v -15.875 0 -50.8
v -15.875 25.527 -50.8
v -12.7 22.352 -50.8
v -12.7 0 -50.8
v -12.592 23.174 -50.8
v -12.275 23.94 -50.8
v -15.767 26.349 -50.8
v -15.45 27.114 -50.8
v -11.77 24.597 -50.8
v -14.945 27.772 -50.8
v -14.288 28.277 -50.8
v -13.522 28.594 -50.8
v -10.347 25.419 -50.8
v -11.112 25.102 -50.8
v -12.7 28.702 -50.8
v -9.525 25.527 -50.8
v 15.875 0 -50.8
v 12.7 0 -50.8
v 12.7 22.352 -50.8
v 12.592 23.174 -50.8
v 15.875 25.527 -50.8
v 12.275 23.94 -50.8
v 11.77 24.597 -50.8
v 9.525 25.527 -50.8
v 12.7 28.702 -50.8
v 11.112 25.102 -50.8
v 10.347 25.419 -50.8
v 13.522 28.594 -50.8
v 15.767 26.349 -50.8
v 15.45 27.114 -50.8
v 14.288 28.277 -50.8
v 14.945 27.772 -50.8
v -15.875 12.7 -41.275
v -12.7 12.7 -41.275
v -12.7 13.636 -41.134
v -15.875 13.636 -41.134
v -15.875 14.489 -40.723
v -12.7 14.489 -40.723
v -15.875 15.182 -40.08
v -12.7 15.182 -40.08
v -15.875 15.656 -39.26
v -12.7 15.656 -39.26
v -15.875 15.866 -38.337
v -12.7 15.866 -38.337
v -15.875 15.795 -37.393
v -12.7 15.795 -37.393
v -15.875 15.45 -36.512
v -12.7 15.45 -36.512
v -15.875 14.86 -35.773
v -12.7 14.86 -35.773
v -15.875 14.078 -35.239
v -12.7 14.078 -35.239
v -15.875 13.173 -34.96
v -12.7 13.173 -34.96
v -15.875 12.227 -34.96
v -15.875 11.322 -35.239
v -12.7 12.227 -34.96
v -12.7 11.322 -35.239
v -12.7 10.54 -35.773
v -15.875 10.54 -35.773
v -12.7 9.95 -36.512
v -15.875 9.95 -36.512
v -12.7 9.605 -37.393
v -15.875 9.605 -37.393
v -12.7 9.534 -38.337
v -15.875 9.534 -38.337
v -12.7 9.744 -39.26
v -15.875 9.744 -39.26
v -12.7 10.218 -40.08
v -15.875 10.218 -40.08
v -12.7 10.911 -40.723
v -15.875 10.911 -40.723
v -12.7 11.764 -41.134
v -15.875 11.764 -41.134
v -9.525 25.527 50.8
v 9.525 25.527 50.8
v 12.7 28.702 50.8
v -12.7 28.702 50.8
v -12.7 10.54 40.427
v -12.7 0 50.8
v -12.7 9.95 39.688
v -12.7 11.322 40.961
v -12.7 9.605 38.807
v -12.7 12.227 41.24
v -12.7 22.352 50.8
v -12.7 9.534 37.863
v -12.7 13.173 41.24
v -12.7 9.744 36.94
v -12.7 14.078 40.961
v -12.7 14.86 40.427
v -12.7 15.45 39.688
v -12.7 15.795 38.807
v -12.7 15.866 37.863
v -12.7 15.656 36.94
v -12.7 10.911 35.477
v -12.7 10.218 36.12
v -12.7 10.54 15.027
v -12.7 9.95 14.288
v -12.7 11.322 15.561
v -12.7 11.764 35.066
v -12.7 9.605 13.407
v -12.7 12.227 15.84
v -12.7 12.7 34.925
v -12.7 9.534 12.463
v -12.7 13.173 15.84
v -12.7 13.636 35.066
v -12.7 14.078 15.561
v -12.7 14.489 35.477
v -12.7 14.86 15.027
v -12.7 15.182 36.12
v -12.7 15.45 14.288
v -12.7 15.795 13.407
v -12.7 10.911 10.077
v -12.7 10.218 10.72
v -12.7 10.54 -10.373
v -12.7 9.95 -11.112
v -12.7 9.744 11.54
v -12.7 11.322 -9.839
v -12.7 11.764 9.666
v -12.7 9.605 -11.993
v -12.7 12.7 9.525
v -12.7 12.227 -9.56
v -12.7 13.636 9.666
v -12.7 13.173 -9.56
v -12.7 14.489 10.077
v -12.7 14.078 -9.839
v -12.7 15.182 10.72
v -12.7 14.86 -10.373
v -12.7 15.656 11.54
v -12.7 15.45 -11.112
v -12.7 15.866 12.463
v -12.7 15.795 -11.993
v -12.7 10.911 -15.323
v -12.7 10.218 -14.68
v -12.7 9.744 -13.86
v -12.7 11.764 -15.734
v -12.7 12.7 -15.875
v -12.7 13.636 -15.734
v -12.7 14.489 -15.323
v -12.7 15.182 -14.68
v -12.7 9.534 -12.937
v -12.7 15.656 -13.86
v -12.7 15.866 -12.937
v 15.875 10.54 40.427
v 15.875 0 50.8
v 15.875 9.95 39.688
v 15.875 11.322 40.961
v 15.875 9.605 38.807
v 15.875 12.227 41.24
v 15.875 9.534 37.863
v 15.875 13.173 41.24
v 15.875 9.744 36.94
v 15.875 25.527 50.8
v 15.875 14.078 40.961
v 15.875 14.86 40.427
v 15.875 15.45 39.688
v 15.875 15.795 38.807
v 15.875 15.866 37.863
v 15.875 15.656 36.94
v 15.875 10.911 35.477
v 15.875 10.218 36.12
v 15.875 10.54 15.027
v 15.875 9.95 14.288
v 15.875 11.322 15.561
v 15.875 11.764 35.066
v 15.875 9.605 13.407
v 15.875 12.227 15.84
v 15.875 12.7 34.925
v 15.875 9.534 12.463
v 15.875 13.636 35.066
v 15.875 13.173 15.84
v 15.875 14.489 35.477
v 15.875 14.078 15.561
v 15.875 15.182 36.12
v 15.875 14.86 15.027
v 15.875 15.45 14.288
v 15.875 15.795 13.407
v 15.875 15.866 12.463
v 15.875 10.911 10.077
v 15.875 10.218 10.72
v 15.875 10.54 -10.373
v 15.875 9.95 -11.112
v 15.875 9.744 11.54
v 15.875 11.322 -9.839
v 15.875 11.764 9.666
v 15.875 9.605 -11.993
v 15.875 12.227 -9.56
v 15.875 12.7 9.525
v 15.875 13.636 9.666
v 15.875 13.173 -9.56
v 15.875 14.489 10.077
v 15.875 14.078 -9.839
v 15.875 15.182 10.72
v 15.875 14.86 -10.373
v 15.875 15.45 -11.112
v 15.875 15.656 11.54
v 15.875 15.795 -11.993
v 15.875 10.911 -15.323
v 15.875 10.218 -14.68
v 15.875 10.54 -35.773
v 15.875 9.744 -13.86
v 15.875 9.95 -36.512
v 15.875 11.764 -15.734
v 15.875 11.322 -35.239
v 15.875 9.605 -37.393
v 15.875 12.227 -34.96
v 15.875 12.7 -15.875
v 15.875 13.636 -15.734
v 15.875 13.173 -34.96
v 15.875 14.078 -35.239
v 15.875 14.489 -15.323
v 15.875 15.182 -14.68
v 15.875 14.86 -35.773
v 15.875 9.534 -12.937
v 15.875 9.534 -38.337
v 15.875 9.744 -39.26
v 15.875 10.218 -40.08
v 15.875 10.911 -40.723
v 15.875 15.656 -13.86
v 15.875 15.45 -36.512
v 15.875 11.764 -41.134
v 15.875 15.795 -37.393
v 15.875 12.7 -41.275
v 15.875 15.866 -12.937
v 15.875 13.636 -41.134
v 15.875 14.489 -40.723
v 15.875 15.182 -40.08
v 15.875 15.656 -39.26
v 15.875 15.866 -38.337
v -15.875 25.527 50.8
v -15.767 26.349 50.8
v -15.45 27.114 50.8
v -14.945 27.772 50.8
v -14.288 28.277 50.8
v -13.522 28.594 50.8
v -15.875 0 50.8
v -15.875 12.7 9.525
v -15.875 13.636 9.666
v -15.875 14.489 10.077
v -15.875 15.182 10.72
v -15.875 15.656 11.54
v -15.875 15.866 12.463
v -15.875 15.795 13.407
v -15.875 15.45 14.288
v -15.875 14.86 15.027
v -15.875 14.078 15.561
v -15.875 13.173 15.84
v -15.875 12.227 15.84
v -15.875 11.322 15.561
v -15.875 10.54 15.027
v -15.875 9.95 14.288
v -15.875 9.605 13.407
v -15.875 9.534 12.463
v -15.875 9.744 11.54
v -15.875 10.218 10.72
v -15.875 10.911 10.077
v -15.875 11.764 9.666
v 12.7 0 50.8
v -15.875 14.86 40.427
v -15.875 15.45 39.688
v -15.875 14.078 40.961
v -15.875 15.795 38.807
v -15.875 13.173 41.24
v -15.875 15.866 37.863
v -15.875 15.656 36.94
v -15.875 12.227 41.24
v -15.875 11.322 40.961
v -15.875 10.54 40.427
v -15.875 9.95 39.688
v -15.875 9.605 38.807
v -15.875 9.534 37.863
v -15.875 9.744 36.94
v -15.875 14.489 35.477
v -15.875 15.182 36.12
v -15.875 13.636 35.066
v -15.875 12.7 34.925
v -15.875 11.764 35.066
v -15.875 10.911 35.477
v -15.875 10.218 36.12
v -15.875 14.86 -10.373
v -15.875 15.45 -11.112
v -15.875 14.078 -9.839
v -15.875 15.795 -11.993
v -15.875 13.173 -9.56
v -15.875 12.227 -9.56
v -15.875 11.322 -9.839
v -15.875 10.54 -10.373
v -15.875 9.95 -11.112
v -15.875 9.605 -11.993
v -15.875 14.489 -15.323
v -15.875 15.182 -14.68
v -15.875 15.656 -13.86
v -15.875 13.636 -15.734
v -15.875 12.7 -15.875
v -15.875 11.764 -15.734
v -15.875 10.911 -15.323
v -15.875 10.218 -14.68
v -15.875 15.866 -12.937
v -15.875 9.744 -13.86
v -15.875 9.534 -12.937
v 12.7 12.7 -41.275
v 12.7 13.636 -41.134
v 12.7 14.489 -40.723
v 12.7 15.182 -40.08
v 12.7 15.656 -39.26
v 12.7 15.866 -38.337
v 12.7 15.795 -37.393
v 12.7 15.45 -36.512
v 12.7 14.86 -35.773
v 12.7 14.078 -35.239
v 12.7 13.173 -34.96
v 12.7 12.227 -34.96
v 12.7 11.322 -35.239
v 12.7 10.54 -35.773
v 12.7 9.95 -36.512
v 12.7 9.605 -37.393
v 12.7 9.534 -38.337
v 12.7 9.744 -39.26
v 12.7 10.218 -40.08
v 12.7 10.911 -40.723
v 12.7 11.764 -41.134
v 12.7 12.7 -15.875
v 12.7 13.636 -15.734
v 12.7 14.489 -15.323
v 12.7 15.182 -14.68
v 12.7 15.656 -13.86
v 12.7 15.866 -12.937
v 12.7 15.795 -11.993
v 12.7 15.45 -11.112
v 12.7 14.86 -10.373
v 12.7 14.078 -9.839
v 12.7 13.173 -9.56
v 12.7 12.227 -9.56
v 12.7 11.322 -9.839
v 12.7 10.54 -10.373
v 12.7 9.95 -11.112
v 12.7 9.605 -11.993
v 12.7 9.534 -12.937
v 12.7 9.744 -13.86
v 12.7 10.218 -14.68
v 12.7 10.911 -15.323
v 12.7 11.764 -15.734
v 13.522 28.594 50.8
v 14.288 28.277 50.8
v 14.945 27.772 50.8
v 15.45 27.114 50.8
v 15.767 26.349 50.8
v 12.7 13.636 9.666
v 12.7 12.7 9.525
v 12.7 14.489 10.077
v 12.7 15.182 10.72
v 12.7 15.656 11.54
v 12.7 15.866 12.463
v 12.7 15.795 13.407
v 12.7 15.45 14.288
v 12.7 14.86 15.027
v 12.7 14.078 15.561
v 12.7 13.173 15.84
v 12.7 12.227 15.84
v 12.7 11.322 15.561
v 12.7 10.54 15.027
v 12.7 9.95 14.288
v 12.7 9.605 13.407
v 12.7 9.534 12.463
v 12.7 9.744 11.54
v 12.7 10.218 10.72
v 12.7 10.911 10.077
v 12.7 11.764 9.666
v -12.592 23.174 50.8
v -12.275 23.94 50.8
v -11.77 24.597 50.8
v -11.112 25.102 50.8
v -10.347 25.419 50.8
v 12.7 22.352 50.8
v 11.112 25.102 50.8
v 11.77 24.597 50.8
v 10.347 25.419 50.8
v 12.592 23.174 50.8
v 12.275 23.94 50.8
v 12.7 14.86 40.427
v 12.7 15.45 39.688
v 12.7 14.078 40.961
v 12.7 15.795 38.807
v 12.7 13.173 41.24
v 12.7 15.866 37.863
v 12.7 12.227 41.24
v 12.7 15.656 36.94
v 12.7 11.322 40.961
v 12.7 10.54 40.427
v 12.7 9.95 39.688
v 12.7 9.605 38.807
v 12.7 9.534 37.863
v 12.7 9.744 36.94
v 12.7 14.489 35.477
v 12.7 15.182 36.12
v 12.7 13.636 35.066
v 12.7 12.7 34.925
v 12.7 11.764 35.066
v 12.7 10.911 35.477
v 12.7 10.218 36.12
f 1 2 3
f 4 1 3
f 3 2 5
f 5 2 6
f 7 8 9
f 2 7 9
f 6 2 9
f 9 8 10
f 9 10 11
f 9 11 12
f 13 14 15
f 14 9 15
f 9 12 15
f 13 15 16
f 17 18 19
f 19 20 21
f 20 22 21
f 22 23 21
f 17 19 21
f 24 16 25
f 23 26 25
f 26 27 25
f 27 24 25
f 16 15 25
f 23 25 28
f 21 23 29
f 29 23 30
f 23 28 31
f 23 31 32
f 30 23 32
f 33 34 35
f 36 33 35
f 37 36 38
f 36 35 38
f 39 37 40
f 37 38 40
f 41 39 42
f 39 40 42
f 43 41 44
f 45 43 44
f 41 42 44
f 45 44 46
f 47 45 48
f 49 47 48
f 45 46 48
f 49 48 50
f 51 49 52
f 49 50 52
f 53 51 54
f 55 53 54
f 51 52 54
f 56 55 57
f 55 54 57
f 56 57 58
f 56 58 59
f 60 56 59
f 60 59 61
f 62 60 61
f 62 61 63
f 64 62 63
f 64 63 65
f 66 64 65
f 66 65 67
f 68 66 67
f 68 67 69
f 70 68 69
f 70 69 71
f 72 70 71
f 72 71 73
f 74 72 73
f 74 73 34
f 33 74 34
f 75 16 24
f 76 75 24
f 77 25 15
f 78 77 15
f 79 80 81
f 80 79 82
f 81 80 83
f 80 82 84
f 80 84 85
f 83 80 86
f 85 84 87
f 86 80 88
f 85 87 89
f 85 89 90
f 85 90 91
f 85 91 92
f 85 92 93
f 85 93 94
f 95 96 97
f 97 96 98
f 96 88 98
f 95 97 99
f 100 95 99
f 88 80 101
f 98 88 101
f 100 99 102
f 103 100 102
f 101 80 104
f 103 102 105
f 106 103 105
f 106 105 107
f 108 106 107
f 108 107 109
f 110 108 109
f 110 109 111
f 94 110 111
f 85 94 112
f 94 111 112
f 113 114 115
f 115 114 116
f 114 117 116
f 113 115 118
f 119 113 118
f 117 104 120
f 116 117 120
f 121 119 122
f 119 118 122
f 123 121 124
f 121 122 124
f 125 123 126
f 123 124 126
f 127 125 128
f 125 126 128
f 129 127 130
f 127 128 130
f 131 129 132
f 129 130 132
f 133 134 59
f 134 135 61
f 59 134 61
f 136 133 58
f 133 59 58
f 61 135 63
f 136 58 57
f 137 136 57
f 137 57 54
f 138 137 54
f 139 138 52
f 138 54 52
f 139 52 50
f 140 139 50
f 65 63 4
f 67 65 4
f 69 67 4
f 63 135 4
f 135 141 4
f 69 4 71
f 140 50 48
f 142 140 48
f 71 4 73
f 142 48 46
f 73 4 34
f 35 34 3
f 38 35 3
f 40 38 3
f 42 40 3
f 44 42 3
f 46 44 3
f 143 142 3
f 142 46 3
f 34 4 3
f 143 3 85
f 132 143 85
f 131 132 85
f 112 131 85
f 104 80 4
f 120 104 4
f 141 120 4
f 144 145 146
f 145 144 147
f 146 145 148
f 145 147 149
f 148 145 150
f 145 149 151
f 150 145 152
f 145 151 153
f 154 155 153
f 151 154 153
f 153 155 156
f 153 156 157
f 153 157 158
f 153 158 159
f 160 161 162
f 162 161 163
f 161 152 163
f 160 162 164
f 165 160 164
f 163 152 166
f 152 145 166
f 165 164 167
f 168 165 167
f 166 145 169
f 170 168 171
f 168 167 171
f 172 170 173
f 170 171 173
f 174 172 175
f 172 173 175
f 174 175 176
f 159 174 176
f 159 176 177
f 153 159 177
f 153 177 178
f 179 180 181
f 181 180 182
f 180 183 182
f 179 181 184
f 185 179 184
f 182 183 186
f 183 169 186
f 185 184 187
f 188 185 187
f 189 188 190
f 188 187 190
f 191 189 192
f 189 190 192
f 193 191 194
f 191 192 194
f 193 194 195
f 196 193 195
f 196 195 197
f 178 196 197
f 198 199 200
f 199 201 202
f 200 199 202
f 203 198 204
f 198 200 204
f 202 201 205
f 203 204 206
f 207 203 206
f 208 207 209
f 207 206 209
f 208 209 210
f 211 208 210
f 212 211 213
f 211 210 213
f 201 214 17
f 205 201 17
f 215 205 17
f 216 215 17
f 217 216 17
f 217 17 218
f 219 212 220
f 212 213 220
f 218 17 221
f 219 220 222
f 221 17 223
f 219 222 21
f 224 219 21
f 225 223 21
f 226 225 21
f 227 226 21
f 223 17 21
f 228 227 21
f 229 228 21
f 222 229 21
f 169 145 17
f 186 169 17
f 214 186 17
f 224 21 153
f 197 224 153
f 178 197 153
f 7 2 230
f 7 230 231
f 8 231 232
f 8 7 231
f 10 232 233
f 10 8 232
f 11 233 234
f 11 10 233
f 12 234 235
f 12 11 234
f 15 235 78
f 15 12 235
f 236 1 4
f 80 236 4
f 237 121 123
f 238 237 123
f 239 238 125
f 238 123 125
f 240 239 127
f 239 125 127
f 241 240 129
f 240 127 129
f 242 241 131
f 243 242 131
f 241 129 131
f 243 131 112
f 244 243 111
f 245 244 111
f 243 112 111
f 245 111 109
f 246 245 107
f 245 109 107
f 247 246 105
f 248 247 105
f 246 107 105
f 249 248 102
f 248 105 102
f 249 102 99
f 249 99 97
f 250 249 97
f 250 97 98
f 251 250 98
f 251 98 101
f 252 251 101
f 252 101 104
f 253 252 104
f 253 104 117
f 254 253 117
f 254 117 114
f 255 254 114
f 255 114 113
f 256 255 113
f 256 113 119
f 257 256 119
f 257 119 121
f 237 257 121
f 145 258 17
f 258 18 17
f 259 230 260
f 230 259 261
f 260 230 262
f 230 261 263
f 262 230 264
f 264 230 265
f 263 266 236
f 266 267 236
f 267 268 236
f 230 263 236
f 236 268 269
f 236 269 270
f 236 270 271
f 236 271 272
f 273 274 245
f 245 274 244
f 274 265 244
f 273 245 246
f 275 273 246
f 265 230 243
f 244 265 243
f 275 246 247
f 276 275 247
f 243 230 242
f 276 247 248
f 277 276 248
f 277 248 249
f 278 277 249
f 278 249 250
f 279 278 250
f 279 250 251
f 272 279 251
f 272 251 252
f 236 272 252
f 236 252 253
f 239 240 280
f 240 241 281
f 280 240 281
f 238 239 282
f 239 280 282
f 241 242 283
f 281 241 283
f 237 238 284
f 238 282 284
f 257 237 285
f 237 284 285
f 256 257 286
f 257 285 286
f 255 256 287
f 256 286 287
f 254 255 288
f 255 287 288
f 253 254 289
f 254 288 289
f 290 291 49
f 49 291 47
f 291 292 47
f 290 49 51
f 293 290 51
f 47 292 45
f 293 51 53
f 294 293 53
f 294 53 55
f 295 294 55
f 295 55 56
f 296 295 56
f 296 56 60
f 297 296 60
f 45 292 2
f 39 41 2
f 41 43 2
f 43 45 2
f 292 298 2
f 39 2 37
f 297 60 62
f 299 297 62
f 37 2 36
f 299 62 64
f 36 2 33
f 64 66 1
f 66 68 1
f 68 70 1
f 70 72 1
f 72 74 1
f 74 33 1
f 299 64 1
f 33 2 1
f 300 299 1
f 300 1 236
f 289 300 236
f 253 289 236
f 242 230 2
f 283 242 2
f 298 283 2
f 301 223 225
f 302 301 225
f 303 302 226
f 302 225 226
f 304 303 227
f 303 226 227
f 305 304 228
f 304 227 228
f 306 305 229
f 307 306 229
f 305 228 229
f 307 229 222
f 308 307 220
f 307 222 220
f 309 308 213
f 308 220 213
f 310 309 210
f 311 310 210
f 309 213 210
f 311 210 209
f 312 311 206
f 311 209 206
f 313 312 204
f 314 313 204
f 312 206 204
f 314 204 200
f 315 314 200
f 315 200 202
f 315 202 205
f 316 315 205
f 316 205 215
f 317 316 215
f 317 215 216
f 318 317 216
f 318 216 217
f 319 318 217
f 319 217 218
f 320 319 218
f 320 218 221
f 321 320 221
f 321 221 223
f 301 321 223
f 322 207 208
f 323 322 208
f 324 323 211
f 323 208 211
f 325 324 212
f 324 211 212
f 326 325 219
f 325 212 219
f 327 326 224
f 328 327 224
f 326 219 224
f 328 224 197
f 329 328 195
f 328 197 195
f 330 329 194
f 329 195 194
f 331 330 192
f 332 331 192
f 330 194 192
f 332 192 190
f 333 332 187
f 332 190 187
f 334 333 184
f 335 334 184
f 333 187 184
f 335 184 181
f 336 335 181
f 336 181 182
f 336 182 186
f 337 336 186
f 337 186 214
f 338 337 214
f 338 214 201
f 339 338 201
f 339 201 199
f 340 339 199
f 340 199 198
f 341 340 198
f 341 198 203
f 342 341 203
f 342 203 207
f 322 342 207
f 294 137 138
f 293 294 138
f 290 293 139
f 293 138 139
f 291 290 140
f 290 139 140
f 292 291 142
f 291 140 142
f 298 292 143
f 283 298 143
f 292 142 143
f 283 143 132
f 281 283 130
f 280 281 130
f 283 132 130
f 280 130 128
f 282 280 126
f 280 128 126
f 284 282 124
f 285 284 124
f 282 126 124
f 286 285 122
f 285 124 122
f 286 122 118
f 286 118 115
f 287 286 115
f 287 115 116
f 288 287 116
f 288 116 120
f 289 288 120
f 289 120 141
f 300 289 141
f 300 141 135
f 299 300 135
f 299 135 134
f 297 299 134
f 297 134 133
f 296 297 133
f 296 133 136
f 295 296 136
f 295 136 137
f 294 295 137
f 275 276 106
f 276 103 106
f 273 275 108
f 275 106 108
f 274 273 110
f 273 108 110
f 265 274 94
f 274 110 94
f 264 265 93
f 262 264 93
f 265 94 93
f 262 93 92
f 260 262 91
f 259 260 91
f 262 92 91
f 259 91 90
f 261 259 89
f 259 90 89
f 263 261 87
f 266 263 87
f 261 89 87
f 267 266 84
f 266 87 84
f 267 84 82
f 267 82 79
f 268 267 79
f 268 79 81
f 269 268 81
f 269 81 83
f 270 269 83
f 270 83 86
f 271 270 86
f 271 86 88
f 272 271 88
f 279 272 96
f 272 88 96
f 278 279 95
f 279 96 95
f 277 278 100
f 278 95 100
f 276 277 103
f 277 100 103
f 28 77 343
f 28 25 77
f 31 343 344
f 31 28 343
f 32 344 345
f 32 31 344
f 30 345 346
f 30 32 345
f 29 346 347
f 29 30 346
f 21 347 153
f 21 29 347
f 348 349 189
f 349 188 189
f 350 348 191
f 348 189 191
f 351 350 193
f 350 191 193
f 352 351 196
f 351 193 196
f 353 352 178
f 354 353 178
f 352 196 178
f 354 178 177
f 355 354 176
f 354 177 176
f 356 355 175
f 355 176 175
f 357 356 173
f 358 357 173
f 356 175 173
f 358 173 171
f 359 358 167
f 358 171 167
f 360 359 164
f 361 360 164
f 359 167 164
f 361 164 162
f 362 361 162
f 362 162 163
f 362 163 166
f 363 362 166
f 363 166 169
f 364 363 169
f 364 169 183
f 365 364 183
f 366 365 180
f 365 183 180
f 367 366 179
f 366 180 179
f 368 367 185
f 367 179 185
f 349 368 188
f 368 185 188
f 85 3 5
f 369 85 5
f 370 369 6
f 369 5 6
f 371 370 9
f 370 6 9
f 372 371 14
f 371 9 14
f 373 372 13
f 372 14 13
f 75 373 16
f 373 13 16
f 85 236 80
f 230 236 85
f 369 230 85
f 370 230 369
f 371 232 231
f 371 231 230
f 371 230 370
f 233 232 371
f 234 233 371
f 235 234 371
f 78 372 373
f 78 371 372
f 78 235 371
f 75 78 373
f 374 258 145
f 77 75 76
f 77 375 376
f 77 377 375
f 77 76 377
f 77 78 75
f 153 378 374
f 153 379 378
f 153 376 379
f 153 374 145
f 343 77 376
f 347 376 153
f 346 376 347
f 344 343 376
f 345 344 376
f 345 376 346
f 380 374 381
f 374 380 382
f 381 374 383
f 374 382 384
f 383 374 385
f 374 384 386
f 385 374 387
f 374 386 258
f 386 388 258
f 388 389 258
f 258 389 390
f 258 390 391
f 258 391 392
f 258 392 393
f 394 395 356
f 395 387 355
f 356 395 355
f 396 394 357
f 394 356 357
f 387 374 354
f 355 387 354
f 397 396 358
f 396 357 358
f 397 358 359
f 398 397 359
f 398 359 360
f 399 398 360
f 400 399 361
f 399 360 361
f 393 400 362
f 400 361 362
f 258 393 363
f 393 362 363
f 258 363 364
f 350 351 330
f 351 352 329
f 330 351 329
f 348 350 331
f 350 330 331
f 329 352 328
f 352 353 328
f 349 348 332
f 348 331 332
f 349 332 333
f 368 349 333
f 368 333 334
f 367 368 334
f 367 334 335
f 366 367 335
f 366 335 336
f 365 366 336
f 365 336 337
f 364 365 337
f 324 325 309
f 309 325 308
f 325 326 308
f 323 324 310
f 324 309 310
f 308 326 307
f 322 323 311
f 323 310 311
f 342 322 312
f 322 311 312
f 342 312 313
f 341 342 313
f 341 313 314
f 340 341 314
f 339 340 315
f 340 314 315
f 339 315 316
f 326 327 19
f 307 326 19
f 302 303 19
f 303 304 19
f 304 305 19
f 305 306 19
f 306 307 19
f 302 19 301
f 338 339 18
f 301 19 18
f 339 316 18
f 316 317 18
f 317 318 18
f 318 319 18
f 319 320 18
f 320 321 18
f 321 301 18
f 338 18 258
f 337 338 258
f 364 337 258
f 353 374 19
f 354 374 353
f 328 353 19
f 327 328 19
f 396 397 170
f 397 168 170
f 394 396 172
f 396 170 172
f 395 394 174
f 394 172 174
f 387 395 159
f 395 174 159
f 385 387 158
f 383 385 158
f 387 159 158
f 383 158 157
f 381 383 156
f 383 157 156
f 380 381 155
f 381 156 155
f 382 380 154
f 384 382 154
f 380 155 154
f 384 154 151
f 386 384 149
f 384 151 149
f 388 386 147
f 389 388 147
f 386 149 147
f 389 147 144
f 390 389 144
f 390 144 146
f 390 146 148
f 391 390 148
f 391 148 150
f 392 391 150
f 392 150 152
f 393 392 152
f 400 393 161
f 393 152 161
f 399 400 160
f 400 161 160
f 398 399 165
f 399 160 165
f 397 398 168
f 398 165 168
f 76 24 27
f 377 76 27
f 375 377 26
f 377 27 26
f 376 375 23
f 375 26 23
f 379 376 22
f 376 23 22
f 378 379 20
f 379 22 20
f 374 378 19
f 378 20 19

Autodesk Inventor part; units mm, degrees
ref_plane "YZ Plane" through (0, 0, 0) normal (1, 0, 0) x (0, 1, 0)
ref_plane "XZ Plane" through (0, 0, 0) normal (0, 1, 0) x (-1, 0, 0)
ref_plane "XY Plane" through (0, 0, 0) normal (0, 0, 1) x (1, 0, 0)
sketch "Sketch1" plane through (0, 0, 0) normal (0, 0, 1) x (1, 0, 0)
  line L0 (-15.875, 0) -> (-12.7, 0)
  line L1 (-12.7, 0) -> (-12.7, 22.352)
  line L2 (-9.525, 25.527) -> (9.525, 25.527)
  line L3 (12.7, 22.352) -> (12.7, 0)
  line L4 (12.7, 0) -> (15.875, 0)
  line L5 (15.875, 0) -> (15.875, 25.527)
  line L6 (12.7, 28.702) -> (-12.7, 28.702)
  line L7 (-15.875, 25.527) -> (-15.875, 0)
  arc A0 (-9.525, 25.527) -> (-12.7, 22.352) centre (-9.525, 22.352) ccw
  arc A1 (12.7, 22.352) -> (9.525, 25.527) centre (9.525, 22.352) ccw
  arc A2 (-12.7, 28.702) -> (-15.875, 25.527) centre (-12.7, 25.527) ccw
  arc A3 (15.875, 25.527) -> (12.7, 28.702) centre (12.7, 25.527) ccw
  line L8 (0, 35.2315) -> (0, -5.8719) projected
  point P0 (0, 0)
  dimension "d0" = 28.702
  dimension "d1" = 31.75
  dimension "d2" = 3.175
  dimension "d3" = 3.175
  dimension "d4" = 3.175
extrude "Extrusion1" add sketch "Sketch1" along normal mid plane 101.6
sketch "Sketch4" plane through (15.875, 0, 50.8) normal (1, 0, 0) x (0, 0, -1)
  line L0 (50.8, -5.7404) -> (50.8, 34.4424) construction
  line L1 (-33.655, 0) -> (201.93, 0) construction
  circle A0 centre (63.5, 12.7) radius 3.175
  point P0 (50.8, 0)
  dimension "d34" = 12.7
  dimension "d35" = 12.7
  dimension "d36" = 6.35
extrude "Extrusion4" cut sketch "Sketch4" against normal up to surface (31.75 mm away)
pattern_linear "Rectangular Pattern3" count 30 spacing 25.4 along (0, 0, 1) count 30 spacing 25.4 along (0, 0, -1) of "Extrusion4"
equation "\"d5\" = ExtensionLen"
equation "\"ExtensionLen\" = 101.6"
properties part number "NTowerChannelMotor" material "Aluminum 6061"
